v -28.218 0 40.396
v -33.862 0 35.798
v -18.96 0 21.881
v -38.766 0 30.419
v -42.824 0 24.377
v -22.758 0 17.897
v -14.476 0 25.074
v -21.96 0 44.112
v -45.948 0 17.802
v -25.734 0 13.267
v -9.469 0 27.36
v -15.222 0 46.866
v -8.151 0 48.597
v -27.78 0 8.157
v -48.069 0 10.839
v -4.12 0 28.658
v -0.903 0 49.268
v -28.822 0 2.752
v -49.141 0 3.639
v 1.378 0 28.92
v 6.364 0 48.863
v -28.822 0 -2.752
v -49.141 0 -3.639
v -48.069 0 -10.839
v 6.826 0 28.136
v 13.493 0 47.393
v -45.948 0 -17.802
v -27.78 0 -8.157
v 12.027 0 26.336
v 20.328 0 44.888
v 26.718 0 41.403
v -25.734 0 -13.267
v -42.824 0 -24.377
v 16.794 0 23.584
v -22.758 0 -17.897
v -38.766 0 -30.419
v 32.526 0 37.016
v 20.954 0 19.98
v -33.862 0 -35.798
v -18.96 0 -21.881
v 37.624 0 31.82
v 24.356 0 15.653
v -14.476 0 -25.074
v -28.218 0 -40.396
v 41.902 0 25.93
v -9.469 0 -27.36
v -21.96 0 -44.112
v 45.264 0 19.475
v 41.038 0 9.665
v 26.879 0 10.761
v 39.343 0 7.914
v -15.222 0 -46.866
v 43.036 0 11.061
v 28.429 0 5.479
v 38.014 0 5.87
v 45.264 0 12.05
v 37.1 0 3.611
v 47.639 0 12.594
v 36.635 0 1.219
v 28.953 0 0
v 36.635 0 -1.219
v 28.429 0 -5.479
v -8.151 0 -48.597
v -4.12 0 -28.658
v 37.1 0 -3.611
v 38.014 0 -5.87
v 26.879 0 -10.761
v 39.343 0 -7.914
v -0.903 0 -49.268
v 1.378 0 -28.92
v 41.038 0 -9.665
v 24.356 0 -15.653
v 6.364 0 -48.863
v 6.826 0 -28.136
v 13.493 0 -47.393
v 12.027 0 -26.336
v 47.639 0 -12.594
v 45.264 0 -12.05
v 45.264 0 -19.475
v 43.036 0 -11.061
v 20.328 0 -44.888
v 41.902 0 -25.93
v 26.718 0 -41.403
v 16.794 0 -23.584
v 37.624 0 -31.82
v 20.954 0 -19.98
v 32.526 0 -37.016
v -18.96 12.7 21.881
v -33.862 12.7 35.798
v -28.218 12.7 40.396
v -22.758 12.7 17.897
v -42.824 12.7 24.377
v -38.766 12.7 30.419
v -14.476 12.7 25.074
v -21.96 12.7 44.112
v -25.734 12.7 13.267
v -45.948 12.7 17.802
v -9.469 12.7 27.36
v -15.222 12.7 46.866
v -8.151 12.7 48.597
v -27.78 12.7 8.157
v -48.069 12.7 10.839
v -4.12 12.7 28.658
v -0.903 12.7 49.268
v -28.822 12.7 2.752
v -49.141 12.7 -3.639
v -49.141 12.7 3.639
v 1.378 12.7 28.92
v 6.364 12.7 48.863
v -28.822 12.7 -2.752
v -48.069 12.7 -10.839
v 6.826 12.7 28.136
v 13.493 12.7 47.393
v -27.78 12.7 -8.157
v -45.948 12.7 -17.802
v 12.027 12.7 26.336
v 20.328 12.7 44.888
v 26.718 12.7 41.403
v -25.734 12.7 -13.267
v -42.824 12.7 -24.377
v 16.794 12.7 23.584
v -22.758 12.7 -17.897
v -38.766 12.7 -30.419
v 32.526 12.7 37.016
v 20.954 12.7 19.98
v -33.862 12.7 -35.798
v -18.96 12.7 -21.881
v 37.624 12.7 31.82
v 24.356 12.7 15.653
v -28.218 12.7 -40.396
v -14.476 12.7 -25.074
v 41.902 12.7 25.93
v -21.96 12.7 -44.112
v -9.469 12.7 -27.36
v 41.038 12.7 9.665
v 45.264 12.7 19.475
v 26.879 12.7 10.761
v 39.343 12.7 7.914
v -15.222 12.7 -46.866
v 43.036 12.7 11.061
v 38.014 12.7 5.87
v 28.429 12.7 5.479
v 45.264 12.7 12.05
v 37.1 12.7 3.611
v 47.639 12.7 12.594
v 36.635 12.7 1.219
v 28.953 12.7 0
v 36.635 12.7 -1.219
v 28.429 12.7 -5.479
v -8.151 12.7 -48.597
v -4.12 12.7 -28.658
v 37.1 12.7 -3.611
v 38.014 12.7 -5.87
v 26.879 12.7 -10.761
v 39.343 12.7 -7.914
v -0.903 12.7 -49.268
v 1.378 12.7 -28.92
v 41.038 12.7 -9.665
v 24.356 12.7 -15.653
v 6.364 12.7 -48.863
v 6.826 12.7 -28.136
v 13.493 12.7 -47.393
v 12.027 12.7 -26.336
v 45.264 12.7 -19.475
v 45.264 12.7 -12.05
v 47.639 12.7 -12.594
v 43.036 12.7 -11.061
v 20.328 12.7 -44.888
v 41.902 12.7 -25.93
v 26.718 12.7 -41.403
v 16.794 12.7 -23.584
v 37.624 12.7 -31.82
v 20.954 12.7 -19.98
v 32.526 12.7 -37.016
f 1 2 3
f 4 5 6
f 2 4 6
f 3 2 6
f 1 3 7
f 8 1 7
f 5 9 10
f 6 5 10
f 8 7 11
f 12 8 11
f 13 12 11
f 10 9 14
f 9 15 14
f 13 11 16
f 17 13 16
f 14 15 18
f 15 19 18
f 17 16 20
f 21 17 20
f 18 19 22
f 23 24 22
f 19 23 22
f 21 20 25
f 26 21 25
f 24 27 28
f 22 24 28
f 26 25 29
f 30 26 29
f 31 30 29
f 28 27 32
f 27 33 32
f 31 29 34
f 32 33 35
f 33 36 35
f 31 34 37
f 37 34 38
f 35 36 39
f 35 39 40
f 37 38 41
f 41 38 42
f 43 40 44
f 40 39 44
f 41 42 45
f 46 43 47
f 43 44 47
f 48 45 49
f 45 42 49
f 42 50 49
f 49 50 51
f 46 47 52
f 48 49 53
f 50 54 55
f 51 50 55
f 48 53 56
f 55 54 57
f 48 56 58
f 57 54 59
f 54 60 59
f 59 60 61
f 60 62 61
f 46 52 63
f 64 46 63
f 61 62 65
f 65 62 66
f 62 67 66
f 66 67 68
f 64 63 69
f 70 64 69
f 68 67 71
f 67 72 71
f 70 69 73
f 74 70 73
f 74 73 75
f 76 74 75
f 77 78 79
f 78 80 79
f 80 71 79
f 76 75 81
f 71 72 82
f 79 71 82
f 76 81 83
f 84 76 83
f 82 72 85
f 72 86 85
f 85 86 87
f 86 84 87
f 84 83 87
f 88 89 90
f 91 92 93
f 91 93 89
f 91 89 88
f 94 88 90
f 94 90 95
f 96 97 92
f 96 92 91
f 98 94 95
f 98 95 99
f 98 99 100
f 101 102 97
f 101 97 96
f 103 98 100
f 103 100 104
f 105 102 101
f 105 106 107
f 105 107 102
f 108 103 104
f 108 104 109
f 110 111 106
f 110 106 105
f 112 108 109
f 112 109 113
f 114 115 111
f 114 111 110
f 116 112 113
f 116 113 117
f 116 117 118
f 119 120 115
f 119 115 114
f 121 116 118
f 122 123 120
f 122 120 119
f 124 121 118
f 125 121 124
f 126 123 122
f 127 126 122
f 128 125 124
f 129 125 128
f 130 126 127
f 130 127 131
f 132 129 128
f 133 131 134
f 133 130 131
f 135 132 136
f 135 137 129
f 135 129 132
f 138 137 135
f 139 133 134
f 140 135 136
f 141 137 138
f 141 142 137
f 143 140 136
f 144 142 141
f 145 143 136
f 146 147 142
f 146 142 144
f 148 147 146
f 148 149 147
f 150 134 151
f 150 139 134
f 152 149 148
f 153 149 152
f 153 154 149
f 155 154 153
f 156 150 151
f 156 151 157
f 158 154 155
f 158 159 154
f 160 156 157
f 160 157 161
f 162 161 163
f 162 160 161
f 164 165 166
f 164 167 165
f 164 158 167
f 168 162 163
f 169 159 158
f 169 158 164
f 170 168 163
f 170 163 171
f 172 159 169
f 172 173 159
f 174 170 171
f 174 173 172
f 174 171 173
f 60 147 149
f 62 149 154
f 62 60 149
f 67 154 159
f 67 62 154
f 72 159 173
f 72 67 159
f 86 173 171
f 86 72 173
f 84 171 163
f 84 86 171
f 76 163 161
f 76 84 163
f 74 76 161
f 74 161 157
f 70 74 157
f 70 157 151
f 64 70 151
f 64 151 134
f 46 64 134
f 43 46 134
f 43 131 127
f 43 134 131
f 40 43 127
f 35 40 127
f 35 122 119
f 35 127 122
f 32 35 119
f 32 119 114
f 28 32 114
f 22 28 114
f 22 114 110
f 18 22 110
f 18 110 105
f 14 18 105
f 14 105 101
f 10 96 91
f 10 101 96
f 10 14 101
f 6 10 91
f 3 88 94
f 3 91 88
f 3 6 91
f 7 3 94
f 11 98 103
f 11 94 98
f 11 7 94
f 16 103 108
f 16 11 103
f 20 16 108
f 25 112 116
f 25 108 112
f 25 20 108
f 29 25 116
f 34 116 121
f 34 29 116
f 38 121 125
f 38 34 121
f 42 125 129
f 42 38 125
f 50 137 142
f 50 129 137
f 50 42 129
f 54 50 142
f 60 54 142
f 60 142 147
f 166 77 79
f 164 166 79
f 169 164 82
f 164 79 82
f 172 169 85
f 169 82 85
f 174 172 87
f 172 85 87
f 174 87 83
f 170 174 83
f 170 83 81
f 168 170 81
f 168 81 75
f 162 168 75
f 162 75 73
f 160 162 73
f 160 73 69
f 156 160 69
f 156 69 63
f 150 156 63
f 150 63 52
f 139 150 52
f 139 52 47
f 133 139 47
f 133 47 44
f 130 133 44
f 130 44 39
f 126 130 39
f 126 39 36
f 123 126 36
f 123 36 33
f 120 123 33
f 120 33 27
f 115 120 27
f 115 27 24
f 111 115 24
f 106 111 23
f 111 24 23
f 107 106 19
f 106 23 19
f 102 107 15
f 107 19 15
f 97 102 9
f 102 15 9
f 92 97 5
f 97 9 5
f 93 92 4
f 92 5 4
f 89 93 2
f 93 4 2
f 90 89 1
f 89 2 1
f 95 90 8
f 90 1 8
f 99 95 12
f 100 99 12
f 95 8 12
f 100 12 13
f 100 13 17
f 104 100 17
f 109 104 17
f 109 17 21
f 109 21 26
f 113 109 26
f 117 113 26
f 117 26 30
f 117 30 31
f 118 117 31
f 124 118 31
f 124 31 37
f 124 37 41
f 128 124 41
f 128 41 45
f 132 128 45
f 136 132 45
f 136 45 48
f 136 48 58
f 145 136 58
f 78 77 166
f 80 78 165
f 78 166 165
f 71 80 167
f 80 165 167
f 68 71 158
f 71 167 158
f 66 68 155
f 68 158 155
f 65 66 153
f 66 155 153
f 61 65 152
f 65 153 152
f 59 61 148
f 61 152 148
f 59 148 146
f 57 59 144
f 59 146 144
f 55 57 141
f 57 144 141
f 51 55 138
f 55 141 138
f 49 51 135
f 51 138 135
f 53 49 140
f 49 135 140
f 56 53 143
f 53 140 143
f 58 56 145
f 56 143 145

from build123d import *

# Parameters (mm, degrees)
SKETCH1_R           = 49.276
BOSS_EXTRUDE1_DEPTH = 12.7
SKETCH1_10_R        = 28.952599956
CUT_EXTRUDE2_DEPTH  = 13.7
SKETCH2_R           = 12.7
CUT_EXTRUDE3_DEPTH  = 13.7


with BuildPart() as part:
    # Sketch1 → Boss-Extrude1 (new body)
    with BuildSketch(Plane(origin=(0, 0, 0), x_dir=(1, 0, 0), z_dir=(0, 1, 0))):
        Circle(SKETCH1_R)
    extrude(amount=BOSS_EXTRUDE1_DEPTH)

    # Sketch1<10> → Cut-Extrude2 (cut, through all)
    with BuildSketch(Plane(origin=(0, 0, 0), x_dir=(1, 0, 0), z_dir=(0, 1, 0))):
        Circle(SKETCH1_10_R)
    extrude(amount=CUT_EXTRUDE2_DEPTH, mode=Mode.SUBTRACT)

    # Sketch2 → Cut-Extrude3 (cut, through all)
    with BuildSketch(Plane(origin=(0, 12.7, 0), x_dir=(1, 0, 0), z_dir=(0, 1, 0))):
        with Locations((49.276, 0)):
            Circle(SKETCH2_R)
    extrude(amount=-CUT_EXTRUDE3_DEPTH, mode=Mode.SUBTRACT)


solid = part.part
